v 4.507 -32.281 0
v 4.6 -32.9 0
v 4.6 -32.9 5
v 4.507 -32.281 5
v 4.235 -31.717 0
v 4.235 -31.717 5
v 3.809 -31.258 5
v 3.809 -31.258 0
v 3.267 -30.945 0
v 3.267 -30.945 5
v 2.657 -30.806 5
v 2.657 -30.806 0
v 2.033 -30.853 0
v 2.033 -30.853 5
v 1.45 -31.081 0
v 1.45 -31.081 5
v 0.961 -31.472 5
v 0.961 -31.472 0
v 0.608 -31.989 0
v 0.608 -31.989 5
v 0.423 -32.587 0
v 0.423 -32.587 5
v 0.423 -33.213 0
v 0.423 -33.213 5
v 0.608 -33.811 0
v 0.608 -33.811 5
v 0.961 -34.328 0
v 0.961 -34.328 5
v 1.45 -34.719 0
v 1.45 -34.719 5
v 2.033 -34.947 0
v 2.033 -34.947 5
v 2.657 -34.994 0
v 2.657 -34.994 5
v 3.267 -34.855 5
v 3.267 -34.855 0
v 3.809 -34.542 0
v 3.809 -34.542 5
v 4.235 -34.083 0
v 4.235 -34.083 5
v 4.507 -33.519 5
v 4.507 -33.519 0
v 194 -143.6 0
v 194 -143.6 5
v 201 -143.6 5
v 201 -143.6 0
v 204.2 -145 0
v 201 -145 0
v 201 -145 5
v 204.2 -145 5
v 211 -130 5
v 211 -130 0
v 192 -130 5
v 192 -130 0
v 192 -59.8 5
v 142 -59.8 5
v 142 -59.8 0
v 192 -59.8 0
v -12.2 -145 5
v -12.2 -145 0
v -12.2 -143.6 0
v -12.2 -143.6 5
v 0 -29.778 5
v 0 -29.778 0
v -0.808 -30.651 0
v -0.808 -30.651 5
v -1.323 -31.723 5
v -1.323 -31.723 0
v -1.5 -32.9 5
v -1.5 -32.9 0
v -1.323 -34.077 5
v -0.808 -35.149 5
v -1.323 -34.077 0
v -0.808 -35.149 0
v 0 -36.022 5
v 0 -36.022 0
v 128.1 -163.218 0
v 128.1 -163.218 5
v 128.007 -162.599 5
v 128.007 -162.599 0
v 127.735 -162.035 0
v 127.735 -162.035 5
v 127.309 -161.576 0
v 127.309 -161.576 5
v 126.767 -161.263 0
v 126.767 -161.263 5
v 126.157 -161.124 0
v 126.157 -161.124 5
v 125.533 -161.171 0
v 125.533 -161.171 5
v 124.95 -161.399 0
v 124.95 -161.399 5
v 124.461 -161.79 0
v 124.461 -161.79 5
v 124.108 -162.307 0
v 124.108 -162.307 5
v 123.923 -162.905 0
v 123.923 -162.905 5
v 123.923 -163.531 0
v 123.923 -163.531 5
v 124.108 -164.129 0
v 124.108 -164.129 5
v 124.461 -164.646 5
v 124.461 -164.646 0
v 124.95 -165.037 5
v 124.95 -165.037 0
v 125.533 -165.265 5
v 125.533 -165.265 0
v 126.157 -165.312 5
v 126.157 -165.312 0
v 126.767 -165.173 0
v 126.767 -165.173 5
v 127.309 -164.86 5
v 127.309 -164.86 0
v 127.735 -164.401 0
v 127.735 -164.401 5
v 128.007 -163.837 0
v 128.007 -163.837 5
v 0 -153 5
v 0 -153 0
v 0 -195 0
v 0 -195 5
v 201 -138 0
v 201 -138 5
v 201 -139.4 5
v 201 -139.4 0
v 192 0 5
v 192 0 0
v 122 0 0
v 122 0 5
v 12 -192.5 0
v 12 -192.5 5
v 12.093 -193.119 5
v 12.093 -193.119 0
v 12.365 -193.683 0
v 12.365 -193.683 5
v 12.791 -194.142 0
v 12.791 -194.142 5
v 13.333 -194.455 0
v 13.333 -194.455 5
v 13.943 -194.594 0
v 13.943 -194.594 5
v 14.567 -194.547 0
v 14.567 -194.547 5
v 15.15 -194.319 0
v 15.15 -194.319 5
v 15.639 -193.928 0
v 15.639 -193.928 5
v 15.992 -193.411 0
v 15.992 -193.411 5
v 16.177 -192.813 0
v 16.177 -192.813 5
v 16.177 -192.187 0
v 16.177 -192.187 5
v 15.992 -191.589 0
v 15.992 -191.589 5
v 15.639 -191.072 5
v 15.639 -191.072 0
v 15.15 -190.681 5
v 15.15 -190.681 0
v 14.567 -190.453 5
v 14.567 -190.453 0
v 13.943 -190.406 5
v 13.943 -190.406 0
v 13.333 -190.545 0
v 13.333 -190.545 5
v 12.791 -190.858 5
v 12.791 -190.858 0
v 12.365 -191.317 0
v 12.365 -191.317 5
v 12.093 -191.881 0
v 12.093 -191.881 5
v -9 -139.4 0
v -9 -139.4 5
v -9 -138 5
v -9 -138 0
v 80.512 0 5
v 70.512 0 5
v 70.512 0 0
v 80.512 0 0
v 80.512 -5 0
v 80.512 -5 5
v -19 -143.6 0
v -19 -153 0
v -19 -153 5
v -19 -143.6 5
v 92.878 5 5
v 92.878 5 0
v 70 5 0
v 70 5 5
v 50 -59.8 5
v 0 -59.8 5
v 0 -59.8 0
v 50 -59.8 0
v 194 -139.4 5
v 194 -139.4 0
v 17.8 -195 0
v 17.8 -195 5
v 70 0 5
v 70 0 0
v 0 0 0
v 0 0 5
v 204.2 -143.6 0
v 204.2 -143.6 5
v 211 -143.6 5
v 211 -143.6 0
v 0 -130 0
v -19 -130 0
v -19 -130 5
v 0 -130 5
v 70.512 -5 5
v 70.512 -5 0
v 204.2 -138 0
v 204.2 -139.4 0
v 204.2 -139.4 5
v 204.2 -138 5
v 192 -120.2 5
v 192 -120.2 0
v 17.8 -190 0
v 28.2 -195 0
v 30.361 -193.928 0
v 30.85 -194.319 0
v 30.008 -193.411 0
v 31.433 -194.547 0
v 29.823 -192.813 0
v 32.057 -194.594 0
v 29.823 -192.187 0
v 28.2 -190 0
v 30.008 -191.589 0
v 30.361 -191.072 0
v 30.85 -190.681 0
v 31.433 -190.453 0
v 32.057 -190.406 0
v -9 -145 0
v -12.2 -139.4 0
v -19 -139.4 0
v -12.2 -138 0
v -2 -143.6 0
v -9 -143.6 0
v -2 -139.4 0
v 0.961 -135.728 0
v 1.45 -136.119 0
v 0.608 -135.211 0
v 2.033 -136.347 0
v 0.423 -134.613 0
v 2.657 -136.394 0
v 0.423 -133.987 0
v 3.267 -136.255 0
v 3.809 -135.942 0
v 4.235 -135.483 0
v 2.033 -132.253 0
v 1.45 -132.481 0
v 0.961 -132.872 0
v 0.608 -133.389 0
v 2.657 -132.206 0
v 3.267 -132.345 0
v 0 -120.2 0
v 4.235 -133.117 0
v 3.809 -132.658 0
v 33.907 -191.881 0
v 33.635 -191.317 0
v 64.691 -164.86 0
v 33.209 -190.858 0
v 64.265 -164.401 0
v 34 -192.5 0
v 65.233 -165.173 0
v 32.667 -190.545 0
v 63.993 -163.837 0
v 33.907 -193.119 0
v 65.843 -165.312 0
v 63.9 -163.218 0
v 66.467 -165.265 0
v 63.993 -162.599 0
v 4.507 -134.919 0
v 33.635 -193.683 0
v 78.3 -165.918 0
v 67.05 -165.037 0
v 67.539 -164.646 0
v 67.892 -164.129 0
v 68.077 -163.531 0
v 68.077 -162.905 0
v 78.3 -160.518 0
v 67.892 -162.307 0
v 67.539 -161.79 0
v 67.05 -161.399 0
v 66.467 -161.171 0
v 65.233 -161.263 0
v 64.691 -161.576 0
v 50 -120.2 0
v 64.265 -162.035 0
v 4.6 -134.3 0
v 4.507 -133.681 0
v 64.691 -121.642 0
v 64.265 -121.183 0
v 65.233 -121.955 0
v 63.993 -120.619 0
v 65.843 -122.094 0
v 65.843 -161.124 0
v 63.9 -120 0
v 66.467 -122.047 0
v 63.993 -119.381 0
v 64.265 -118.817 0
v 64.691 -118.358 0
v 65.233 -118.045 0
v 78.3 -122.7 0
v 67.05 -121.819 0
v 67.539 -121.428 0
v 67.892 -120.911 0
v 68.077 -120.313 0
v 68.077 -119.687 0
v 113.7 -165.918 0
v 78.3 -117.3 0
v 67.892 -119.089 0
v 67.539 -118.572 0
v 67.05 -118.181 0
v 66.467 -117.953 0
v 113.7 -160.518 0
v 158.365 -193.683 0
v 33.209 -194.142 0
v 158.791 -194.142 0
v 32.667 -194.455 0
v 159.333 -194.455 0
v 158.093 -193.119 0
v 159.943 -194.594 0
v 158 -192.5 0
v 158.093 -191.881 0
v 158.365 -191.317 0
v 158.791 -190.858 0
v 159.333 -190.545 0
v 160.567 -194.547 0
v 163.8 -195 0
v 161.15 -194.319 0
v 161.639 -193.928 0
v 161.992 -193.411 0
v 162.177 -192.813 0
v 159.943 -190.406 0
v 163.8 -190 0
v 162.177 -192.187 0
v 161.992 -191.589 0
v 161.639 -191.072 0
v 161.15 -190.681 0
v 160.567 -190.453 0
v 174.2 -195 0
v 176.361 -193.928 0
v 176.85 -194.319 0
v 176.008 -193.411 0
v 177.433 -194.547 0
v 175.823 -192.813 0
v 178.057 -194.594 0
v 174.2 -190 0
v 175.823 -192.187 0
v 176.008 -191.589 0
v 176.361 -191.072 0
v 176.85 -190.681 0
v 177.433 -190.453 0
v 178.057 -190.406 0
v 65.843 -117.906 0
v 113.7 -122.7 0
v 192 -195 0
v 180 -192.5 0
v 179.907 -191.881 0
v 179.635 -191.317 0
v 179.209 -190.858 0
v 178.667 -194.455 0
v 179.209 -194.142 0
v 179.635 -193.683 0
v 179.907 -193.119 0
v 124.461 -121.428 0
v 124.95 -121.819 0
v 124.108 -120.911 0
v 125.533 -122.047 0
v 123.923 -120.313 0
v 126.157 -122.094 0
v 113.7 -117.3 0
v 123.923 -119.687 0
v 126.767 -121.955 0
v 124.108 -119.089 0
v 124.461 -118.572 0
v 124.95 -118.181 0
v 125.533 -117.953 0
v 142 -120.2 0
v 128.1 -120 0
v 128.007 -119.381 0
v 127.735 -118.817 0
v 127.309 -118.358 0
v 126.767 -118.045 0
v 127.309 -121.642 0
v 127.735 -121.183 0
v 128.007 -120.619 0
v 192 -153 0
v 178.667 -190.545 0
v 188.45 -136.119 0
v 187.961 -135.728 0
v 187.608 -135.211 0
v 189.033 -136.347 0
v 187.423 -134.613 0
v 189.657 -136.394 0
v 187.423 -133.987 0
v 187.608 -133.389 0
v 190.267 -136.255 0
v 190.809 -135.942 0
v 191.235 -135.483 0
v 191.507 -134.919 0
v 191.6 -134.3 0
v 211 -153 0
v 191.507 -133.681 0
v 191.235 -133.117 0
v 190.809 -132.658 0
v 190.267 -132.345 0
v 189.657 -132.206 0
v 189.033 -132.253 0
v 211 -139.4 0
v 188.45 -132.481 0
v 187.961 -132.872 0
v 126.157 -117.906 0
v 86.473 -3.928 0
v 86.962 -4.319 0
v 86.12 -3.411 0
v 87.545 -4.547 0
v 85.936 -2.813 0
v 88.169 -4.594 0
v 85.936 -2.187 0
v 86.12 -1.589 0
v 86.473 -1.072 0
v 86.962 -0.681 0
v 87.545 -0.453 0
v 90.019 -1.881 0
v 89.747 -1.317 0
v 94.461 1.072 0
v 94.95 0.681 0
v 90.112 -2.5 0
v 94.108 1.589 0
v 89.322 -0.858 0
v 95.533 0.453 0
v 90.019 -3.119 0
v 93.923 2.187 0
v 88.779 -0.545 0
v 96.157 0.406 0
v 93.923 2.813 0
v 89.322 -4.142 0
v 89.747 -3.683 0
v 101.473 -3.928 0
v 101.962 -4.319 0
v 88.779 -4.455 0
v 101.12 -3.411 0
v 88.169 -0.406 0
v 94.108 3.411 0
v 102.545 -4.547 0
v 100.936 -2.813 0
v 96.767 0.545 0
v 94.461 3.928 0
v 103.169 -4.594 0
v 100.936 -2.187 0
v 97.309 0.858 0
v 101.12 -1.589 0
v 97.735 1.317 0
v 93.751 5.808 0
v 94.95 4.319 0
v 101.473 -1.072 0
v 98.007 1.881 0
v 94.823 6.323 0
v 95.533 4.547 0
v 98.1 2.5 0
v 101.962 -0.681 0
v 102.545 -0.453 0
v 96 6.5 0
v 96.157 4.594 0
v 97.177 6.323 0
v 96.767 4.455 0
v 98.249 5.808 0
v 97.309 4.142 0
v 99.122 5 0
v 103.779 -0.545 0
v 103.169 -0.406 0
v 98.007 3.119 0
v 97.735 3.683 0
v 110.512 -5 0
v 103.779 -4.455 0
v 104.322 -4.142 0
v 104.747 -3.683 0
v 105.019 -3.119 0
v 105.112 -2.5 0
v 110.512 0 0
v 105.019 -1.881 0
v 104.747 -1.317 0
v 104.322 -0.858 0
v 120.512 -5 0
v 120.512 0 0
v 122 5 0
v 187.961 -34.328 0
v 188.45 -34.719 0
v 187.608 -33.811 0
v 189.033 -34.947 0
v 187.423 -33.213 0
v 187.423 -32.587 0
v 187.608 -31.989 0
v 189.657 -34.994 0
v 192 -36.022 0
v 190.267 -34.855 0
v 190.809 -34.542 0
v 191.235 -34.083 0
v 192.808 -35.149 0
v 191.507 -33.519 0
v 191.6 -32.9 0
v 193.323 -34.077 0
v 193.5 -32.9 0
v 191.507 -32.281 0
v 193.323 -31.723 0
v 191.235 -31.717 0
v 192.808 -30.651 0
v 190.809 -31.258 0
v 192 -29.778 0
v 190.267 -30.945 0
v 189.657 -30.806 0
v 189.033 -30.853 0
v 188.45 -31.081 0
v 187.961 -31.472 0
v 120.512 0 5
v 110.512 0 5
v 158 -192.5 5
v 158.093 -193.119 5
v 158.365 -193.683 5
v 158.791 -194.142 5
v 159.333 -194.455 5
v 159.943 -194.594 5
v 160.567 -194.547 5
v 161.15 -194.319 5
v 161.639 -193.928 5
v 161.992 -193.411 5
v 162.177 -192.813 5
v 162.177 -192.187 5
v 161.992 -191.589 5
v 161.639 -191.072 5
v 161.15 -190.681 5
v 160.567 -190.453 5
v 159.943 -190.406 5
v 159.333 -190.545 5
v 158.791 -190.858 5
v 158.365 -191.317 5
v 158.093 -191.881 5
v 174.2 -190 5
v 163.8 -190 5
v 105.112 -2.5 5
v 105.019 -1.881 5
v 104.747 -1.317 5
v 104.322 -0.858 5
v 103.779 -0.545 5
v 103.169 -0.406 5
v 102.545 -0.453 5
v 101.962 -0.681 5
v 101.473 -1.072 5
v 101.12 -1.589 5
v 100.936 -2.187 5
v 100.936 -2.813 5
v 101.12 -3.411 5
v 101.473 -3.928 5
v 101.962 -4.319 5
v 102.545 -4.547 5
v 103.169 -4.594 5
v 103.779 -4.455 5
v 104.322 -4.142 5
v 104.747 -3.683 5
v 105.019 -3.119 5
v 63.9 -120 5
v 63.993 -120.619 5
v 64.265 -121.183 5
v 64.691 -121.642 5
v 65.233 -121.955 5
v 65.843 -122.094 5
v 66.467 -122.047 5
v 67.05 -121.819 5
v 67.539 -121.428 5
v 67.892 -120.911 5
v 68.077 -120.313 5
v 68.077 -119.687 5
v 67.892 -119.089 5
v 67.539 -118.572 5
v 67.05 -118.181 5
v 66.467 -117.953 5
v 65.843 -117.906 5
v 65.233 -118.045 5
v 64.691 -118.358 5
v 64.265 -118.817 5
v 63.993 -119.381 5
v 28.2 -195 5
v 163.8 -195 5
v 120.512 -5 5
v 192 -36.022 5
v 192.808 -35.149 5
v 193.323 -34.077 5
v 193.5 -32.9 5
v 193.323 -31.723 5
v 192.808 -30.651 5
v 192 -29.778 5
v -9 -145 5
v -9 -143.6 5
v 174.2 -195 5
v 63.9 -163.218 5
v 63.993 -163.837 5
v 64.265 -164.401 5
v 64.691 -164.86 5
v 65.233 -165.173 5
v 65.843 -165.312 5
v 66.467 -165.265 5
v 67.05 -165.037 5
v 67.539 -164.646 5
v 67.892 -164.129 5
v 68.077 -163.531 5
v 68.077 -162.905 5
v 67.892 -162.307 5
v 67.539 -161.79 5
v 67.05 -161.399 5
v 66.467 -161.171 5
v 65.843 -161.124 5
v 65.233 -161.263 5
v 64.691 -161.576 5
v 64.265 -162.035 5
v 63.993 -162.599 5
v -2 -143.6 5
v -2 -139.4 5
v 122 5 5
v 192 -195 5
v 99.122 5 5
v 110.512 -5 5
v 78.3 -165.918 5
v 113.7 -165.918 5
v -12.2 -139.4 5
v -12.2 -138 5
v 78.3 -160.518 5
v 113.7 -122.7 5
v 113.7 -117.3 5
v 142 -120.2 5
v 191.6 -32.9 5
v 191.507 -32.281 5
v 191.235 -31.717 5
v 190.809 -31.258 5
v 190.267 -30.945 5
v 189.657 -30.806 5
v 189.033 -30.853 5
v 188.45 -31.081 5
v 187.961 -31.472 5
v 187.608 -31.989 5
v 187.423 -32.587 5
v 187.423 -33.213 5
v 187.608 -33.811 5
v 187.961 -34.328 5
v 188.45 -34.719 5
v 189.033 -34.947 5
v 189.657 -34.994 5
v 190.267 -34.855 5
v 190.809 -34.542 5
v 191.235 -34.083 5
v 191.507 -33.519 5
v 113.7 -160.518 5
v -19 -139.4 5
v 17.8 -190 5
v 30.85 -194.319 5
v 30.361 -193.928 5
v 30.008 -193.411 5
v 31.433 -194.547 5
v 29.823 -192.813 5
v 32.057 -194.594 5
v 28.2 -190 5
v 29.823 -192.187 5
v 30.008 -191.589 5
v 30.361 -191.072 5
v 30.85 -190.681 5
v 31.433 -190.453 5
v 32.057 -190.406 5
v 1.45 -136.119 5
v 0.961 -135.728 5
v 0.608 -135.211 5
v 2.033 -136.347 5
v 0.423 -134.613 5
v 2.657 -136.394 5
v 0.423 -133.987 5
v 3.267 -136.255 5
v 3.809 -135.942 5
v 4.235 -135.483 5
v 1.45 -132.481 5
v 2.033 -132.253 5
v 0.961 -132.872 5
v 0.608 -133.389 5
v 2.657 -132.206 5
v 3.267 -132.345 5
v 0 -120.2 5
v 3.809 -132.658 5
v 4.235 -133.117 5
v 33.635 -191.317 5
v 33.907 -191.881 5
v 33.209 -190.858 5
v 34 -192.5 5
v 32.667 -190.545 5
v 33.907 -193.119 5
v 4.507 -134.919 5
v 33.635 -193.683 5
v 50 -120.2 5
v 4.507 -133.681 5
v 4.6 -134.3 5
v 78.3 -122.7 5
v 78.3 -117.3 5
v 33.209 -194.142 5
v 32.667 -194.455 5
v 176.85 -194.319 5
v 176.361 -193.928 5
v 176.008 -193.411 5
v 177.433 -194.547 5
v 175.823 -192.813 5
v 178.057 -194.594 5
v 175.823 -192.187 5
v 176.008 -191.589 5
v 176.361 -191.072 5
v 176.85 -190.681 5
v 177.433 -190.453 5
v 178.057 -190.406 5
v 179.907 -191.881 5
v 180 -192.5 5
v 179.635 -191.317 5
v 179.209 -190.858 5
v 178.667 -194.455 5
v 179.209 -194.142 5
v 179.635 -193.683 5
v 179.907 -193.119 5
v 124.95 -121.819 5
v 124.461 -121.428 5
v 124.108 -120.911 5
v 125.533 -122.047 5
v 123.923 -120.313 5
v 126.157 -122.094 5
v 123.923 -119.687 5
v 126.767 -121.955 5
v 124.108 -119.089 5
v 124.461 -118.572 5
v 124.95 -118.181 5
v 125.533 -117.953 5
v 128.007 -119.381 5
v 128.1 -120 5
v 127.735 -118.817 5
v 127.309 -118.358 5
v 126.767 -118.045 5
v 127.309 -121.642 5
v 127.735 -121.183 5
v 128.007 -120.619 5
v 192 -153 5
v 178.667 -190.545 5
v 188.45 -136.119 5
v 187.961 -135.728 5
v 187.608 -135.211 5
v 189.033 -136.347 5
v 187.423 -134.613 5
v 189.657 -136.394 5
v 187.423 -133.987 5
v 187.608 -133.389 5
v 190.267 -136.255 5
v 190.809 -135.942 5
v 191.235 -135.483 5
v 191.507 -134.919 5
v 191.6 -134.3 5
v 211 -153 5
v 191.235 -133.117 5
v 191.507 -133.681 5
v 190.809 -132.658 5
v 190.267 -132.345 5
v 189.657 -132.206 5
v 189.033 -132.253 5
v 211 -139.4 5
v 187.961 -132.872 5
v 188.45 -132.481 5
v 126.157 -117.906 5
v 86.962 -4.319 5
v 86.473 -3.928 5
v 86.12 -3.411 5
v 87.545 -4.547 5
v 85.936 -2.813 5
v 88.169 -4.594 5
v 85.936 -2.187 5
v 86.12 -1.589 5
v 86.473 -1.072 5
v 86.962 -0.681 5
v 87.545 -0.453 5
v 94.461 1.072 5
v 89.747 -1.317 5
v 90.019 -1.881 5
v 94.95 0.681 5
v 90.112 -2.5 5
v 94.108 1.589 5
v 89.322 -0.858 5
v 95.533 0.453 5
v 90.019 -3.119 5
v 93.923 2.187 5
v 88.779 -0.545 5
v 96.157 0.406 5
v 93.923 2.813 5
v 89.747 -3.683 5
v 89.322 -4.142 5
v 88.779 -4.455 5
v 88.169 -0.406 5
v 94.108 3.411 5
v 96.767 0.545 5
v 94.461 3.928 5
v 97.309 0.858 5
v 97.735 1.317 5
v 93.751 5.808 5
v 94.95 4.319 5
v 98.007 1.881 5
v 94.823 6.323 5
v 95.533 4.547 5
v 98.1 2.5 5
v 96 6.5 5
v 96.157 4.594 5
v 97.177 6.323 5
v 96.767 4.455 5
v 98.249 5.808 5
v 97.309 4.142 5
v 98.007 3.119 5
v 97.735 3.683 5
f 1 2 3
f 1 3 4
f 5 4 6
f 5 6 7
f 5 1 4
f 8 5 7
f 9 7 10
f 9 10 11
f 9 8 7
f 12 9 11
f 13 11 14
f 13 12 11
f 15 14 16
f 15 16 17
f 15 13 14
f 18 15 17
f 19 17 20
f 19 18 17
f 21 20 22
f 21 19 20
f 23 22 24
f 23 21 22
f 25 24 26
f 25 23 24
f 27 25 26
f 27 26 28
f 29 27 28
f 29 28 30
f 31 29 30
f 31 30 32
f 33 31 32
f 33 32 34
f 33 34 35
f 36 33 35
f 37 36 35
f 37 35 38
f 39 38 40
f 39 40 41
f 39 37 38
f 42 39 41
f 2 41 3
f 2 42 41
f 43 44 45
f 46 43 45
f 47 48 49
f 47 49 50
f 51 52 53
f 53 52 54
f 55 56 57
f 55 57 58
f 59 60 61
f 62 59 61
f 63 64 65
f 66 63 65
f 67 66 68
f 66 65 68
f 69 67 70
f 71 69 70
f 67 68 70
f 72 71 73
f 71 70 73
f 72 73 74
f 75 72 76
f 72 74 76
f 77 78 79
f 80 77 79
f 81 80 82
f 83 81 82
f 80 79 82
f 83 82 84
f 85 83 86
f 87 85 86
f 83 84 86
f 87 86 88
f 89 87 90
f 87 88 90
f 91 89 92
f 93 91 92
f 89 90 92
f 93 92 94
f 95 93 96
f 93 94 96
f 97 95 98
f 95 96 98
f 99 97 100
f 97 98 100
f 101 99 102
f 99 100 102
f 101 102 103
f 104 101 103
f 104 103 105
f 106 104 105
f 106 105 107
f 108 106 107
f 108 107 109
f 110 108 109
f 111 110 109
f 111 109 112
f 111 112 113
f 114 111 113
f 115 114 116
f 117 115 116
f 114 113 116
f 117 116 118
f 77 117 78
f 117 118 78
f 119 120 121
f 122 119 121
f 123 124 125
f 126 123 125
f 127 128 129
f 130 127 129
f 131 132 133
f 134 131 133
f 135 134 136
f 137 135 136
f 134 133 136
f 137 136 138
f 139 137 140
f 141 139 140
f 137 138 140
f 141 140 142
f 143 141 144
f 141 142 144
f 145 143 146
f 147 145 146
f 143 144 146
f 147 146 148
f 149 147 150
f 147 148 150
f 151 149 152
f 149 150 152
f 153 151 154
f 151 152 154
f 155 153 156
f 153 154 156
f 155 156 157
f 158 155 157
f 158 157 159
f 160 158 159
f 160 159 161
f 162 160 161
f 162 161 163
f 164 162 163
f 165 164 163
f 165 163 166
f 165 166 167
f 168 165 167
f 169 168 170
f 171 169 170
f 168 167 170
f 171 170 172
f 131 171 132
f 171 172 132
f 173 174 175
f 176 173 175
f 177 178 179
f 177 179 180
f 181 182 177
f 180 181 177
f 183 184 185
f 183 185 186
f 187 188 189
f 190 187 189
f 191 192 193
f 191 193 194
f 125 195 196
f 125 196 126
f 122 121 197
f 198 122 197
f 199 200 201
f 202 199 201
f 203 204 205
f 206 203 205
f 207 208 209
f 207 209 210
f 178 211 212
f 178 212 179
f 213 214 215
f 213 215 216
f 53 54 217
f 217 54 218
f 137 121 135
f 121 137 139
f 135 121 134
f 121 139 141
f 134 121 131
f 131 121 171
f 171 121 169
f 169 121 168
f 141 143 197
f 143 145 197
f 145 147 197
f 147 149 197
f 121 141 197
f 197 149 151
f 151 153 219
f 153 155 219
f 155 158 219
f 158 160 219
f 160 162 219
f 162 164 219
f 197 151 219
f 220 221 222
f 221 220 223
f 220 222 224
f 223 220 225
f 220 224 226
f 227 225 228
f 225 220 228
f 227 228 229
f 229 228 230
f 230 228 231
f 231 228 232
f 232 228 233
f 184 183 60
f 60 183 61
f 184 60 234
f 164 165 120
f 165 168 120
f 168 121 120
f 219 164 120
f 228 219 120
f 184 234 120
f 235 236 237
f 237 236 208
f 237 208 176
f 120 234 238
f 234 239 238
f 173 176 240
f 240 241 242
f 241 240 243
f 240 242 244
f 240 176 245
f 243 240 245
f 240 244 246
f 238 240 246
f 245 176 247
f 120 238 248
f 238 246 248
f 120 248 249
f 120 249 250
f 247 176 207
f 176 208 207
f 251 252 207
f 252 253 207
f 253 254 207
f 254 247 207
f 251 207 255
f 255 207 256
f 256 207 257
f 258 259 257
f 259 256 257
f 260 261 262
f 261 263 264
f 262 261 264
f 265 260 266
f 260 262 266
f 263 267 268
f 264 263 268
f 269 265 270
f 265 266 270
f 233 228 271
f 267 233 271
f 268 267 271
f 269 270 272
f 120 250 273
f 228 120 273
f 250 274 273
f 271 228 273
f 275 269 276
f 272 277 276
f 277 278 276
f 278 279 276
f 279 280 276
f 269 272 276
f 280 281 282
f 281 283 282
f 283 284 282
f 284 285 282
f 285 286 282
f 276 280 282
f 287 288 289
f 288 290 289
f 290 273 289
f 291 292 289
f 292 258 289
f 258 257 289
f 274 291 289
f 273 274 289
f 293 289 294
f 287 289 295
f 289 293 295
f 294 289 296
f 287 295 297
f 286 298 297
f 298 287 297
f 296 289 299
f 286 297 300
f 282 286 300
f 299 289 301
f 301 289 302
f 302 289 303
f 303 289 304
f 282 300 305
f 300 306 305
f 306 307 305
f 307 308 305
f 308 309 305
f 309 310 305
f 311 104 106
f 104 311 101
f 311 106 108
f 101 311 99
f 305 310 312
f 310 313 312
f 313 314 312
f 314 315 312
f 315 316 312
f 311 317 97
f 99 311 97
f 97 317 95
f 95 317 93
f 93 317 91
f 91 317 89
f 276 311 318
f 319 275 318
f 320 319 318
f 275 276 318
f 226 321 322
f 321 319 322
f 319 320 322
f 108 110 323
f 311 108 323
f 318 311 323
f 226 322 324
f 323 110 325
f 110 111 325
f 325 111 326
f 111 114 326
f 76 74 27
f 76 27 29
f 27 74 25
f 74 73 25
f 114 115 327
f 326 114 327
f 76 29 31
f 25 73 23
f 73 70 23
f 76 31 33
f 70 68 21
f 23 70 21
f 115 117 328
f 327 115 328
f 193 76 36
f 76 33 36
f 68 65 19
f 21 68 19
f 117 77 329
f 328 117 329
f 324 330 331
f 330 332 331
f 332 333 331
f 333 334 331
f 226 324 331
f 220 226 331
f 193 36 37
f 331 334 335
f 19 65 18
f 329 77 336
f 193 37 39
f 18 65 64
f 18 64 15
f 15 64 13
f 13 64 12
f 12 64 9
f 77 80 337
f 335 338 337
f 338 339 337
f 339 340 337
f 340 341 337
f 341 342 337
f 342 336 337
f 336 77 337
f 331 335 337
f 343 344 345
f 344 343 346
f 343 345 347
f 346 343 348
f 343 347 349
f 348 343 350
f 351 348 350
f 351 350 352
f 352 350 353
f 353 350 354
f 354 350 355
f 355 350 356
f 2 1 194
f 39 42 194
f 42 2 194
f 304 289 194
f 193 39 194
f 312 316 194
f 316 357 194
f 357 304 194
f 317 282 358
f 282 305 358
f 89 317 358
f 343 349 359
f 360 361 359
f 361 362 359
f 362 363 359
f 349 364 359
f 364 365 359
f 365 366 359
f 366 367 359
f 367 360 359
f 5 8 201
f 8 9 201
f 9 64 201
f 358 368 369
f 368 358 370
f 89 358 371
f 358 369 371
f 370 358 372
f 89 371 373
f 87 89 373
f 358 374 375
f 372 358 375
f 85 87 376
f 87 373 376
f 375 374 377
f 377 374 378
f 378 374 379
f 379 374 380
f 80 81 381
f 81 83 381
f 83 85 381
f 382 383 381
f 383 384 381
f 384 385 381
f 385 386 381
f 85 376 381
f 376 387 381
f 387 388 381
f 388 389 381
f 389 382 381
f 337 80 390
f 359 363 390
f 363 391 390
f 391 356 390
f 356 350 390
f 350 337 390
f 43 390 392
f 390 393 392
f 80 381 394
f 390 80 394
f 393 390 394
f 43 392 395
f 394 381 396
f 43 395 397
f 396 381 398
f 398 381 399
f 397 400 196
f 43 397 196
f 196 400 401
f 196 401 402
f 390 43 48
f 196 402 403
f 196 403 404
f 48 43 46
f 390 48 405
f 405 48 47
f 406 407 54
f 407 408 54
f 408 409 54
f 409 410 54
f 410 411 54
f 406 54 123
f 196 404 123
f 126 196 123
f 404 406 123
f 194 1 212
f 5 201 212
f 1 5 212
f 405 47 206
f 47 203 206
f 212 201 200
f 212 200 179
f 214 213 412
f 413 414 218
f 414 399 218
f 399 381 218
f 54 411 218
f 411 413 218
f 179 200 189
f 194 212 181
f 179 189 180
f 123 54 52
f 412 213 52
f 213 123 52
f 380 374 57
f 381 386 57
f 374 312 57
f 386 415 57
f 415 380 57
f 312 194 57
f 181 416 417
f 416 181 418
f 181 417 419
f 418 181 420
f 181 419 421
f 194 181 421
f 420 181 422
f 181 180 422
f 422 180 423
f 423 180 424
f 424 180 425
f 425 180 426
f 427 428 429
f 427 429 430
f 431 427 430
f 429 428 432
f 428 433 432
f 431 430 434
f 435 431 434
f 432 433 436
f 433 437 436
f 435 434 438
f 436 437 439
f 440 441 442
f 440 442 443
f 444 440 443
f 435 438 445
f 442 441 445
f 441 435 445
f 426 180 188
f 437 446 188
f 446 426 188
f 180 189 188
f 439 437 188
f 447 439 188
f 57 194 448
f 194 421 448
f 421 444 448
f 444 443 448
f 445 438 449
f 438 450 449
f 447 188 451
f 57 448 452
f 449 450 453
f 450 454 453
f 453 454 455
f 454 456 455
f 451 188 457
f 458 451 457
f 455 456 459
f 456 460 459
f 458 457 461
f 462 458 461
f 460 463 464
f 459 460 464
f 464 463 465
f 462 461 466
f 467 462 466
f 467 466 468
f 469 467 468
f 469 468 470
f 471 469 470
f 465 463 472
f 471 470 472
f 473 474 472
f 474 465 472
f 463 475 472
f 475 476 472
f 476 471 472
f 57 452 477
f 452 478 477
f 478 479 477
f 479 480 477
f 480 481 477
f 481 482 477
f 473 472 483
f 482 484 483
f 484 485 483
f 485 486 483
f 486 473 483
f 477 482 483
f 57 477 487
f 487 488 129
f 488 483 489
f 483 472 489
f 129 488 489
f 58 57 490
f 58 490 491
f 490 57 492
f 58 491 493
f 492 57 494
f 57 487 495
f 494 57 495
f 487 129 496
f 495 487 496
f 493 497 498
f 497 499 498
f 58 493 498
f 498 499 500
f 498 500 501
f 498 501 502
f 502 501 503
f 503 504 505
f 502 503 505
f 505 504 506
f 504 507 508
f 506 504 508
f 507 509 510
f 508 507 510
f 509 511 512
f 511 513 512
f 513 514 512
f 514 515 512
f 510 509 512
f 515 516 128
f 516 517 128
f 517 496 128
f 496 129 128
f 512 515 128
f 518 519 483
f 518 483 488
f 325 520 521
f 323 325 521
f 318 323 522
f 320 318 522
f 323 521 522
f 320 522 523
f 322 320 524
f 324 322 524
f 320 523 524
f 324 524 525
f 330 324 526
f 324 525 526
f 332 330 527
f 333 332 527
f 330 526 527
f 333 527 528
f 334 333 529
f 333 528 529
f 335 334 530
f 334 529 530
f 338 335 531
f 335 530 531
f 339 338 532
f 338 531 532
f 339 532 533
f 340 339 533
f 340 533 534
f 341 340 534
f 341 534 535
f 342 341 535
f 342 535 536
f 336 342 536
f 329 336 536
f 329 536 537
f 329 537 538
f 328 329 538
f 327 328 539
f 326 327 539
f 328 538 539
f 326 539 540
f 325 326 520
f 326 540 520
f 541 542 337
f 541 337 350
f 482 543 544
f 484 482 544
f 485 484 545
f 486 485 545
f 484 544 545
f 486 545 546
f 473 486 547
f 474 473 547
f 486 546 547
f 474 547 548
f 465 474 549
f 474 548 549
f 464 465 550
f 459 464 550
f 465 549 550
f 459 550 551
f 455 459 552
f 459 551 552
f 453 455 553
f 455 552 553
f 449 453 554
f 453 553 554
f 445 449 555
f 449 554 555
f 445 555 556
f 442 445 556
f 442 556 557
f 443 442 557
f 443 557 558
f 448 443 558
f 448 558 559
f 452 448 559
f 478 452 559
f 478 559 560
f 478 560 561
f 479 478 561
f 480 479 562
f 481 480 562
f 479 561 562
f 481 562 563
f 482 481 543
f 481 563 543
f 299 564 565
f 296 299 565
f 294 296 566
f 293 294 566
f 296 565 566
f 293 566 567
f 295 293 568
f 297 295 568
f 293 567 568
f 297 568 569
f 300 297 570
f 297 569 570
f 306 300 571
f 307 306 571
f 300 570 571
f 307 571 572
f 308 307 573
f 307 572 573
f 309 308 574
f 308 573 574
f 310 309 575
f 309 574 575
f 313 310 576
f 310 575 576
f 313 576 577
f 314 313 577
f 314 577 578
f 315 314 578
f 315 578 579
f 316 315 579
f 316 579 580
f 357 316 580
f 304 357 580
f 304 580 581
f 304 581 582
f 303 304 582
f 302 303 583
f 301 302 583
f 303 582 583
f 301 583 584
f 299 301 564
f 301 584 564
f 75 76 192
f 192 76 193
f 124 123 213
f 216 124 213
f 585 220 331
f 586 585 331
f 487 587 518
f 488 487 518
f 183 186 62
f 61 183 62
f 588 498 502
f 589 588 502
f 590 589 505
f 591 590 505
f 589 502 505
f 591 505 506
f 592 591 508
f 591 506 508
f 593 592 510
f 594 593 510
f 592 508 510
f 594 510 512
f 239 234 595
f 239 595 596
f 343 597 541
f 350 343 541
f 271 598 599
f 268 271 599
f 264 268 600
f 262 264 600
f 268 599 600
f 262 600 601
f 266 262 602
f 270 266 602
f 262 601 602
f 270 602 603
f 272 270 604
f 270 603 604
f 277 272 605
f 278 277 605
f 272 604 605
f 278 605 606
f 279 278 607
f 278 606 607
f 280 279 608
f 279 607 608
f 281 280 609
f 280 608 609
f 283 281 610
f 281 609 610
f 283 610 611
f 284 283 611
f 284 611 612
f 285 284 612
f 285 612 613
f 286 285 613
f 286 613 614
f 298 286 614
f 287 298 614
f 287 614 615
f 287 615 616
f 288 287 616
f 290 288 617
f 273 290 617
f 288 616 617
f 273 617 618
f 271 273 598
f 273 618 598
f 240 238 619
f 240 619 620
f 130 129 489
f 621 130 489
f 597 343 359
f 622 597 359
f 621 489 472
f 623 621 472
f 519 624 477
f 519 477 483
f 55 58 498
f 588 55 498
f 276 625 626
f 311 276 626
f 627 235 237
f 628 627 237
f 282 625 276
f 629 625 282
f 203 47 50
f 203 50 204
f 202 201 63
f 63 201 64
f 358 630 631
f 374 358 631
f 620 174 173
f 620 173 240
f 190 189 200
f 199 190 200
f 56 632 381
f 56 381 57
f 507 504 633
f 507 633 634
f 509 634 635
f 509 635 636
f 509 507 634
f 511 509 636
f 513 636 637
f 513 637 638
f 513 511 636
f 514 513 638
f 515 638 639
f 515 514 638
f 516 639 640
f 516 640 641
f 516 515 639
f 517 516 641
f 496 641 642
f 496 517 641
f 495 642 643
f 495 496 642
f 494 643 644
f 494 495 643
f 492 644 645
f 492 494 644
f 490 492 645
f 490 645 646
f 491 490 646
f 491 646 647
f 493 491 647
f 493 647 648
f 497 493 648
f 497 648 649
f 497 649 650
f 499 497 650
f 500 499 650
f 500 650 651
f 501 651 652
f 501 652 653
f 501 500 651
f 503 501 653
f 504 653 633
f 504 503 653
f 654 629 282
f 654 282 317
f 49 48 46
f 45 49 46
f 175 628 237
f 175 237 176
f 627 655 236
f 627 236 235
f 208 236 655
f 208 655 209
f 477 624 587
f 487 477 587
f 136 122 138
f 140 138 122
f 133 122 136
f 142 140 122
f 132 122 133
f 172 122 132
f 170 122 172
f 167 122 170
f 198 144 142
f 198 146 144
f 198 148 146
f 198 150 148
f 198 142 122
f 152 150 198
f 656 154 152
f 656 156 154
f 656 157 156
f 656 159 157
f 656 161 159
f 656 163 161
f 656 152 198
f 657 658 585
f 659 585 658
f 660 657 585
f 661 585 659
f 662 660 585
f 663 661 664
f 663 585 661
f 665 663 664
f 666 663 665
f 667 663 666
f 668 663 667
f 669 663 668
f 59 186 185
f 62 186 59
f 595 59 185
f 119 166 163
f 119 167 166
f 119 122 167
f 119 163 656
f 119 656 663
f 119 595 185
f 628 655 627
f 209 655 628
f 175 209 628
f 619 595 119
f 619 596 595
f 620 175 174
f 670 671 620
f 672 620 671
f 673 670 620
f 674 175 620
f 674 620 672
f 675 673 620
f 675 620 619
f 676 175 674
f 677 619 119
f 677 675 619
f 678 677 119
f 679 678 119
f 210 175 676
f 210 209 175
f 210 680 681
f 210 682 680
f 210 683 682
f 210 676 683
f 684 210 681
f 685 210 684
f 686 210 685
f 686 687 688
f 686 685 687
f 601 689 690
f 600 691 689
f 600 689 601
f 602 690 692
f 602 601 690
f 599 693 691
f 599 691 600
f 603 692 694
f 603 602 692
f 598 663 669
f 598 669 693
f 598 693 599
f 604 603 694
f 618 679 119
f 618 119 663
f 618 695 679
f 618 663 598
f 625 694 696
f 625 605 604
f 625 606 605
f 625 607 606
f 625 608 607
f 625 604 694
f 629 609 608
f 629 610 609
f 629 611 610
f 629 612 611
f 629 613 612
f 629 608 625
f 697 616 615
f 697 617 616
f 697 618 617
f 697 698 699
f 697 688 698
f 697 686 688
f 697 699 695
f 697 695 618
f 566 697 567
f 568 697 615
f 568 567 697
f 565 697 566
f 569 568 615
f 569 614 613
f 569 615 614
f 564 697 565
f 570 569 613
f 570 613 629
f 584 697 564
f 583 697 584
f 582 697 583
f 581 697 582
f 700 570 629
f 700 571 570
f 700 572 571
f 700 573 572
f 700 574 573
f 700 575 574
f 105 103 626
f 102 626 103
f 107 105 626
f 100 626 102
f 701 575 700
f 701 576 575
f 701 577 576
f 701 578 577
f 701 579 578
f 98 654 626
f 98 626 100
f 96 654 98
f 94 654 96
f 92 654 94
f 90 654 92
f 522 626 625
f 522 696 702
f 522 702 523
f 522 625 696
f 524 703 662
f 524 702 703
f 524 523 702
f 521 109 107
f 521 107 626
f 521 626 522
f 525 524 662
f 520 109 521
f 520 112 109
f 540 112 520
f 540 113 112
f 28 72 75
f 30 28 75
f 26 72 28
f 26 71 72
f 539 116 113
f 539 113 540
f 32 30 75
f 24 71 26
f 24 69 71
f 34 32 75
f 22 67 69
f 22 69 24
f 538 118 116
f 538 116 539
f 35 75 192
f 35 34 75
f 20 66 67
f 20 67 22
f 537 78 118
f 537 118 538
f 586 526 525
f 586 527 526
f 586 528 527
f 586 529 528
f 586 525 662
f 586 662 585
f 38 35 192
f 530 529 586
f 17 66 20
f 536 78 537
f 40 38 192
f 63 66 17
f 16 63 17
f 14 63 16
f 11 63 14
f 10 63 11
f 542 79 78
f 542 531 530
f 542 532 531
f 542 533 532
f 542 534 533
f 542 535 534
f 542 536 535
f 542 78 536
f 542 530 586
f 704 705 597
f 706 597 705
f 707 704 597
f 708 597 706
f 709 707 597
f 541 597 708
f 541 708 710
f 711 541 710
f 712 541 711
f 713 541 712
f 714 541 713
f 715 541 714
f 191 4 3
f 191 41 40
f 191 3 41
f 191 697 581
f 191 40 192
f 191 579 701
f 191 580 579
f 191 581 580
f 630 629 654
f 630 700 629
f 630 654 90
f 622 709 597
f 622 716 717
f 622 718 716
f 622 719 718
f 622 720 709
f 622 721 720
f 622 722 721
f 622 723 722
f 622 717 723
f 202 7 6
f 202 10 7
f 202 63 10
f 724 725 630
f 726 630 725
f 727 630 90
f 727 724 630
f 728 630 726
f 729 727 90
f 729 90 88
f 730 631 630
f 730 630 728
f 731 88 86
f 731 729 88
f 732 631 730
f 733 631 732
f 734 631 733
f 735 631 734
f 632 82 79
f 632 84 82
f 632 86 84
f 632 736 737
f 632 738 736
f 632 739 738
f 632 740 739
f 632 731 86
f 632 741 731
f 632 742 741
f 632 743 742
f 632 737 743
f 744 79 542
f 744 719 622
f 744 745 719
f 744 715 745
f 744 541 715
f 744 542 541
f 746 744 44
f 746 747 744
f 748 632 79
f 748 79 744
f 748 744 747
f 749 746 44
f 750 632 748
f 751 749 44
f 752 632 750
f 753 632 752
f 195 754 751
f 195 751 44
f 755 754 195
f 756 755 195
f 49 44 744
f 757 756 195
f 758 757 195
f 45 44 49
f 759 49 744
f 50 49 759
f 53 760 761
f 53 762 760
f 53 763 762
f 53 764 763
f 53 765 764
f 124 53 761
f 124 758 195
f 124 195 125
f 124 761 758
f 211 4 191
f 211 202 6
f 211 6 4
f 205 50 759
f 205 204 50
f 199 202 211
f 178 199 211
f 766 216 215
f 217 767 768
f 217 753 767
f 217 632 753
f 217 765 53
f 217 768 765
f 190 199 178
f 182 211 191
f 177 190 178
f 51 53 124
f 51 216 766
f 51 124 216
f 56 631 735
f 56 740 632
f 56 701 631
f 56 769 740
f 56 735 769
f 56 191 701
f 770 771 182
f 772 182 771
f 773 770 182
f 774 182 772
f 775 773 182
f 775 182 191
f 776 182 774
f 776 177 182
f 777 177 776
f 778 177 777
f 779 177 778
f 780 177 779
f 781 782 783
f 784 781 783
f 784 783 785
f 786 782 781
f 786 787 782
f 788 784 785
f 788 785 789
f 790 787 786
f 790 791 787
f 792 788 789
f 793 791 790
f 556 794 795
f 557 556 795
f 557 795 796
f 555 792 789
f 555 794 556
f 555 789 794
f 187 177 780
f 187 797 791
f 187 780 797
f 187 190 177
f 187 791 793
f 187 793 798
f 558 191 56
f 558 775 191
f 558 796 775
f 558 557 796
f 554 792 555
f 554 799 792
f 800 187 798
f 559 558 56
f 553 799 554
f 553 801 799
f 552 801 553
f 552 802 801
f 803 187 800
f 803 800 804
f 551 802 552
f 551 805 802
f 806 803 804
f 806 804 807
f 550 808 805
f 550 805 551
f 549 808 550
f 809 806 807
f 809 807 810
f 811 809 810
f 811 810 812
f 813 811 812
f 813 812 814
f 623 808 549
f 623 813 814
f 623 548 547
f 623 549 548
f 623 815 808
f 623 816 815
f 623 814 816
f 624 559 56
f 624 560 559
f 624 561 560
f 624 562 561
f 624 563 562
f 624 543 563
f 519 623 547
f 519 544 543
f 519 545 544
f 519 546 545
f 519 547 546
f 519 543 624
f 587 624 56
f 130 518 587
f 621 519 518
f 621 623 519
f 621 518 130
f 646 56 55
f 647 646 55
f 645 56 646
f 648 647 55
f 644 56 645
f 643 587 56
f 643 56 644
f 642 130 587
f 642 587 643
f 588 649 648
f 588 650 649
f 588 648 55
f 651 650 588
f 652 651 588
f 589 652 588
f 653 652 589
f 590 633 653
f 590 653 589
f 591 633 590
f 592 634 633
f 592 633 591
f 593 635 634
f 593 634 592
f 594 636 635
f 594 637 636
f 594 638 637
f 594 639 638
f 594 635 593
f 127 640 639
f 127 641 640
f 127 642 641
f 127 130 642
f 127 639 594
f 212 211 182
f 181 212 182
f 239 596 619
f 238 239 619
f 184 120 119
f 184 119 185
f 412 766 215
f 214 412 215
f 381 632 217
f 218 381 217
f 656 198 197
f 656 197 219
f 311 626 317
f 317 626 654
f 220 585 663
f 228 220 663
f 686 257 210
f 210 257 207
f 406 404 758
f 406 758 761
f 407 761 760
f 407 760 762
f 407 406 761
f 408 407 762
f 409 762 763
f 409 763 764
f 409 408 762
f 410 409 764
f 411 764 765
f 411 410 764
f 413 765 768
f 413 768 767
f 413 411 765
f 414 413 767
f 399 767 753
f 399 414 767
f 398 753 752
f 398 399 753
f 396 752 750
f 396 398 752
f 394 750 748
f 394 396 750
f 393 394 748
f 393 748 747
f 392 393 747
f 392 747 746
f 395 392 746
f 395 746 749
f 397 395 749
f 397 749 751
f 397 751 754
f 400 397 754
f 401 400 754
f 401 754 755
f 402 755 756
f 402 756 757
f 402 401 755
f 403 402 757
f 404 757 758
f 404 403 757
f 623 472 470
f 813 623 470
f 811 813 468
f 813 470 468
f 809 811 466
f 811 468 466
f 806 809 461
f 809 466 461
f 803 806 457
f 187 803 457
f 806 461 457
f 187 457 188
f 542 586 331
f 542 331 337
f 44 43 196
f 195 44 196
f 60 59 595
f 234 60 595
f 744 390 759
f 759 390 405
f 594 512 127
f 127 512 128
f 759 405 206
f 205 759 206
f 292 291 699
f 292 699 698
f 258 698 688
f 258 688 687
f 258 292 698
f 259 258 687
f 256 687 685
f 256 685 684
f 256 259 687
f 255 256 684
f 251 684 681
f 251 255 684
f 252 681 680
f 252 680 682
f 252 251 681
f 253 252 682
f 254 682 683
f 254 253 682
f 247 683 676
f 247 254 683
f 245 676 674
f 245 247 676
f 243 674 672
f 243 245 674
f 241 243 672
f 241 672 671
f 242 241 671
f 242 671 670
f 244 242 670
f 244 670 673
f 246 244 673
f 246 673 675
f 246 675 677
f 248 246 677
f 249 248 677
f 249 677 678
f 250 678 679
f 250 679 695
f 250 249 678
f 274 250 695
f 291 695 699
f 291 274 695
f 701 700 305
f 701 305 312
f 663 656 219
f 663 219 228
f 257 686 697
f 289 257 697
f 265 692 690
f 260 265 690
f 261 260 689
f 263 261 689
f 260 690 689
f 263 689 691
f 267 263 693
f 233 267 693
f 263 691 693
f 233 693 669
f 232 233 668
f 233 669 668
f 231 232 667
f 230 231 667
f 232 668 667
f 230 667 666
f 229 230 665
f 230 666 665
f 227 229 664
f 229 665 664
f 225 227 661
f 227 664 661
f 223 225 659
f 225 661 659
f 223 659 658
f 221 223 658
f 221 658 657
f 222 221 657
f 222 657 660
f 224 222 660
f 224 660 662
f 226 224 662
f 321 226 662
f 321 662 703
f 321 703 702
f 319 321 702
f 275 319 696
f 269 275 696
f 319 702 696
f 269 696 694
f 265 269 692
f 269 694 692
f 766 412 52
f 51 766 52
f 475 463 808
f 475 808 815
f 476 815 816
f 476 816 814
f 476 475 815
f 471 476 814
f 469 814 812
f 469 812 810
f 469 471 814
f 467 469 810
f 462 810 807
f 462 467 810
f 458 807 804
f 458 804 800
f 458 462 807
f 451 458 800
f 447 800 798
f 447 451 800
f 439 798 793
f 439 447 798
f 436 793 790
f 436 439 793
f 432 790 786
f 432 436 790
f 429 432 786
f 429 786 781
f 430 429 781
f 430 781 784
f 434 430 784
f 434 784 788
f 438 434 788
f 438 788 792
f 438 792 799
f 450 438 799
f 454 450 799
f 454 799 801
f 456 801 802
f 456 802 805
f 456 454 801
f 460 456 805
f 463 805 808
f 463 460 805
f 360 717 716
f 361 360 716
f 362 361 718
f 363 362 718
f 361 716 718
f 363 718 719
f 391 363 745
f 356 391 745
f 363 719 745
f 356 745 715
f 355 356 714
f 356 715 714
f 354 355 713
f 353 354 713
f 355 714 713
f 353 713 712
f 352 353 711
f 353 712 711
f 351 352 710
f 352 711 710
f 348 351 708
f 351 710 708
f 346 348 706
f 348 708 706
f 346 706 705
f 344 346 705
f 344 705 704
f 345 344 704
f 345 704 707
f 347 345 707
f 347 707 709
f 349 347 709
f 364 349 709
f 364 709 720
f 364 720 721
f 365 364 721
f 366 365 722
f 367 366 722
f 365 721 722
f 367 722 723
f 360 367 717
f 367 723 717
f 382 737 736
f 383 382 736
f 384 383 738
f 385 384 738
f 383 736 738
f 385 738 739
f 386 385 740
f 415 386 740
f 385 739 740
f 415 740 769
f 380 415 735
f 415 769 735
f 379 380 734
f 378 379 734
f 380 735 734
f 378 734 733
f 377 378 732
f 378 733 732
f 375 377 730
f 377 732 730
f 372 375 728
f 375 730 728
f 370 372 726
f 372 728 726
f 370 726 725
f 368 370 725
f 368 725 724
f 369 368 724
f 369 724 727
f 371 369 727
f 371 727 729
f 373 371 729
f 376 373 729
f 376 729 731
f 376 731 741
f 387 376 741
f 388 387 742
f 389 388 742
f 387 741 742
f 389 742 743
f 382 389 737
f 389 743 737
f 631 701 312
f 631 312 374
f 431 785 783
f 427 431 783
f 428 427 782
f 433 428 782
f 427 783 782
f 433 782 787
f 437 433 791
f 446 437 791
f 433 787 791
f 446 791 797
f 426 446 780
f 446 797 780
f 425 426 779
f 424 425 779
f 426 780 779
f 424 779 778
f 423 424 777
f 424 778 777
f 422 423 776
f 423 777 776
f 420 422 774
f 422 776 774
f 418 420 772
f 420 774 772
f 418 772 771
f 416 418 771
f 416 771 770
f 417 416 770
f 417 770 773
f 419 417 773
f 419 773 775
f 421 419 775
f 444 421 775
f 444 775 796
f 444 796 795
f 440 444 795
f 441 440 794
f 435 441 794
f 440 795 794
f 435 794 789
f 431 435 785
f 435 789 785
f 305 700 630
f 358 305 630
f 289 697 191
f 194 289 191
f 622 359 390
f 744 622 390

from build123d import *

# Parameters (mm, degrees)
SKETCH1_R           = 2.1
BOSS_EXTRUDE1_DEPTH = 5
SKETCH5_W           = 35
SKETCH5_H           = 5
SKETCH5_W_2         = 10
CUT_EXTRUDE2_DEPTH  = 5
SKETCH6_R           = 2.1
CUT_EXTRUDE3_DEPTH  = 5
SKETCH8_R           = 2.1
SKETCH8_W           = 10
SKETCH8_H           = 5
CUT_EXTRUDE4_DEPTH  = 5
BOSS_EXTRUDE3_START = -5
BOSS_EXTRUDE3_DEPTH = 5
SKETCH12_W          = 10.4
SKETCH12_H          = 5
CUT_EXTRUDE5_DEPTH  = 5
SKETCH13_W          = 35.4
SKETCH13_H          = 5.4
CUT_EXTRUDE6_DEPTH  = 5
SKETCH16_W          = 50
SKETCH16_H          = 60.4
CUT_EXTRUDE8_DEPTH  = 5
SKETCH17_W          = 6.8
SKETCH17_H          = 4.2
SKETCH17_W_2        = 3.2
SKETCH17_H_2        = 1.4
SKETCH17_W_3        = 7
CUT_EXTRUDE9_DEPTH  = 5


with BuildPart() as part:
    # Sketch1 → Boss-Extrude1 (new body)
    with BuildSketch(Plane.XY):
        with BuildLine():
            ThreePointArc((0, -29.777501001), (-1.5, -32.9), (0, -36.022498999))
            Line((0, -36.022498999), (0, -60))
            Line((0, -60), (50, -60))
            Line((50, -60), (50, -120))
            Line((50, -120), (0, -120))
            Line((0, -120), (0, -131.177501001))
            ThreePointArc((0, -131.177501001), (-1.5, -134.3), (0, -137.422498999))
            Line((0, -137.422498999), (0, -195))
            Line((0, -195), (192, -195))
            Line((192, -195), (192, -137.422498999))
            ThreePointArc((192, -137.422498999), (193.5, -134.3), (192, -131.177501001))
            Line((192, -131.177501001), (192, -120))
            Line((192, -120), (142, -120))
            Line((142, -120), (142, -60))
            Line((142, -60), (192, -60))
            Line((192, -60), (192, -36.022498999))
            ThreePointArc((192, -36.022498999), (193.5, -32.9), (192, -29.777501001))
            Line((192, -29.777501001), (192, 0))
            Line((192, 0), (122, 0))
            Line((122, 0), (122, 5))
            Line((122, 5), (99.122498999, 5))
            ThreePointArc((99.122498999, 5), (96, 6.5), (92.877501001, 5))
            Line((92.877501001, 5), (70, 5))
            Line((70, 5), (70, 0))
            Line((70, 0), (59, 0))
            Line((59, 0), (0, 0))
            Line((0, 0), (0, -21))
            Line((0, -21), (0, -29.777501001))
        make_face()
        with Locations((2.5, -134.3)):
            Circle(SKETCH1_R, mode=Mode.SUBTRACT)
        with Locations((189.5, -134.3)):
            Circle(SKETCH1_R, mode=Mode.SUBTRACT)
        with Locations((2.5, -32.9)):
            Circle(SKETCH1_R, mode=Mode.SUBTRACT)
        with Locations((96, 2.5)):
            Circle(SKETCH1_R, mode=Mode.SUBTRACT)
        with Locations((189.5, -32.9)):
            Circle(SKETCH1_R, mode=Mode.SUBTRACT)
    extrude(amount=BOSS_EXTRUDE1_DEPTH)

    # Sketch5 → Cut-Extrude2 (cut)
    with BuildSketch(Plane.XY.offset(5)):
        with Locations((96, -163.217967697)):
            Rectangle(SKETCH5_W, SKETCH5_H)
        with Locations((96, -120)):
            Rectangle(SKETCH5_W, SKETCH5_H)
        with Locations((23, -192.5)):
            Rectangle(SKETCH5_W_2, SKETCH5_H)
        with Locations((169, -192.5)):
            Rectangle(SKETCH5_W_2, SKETCH5_H)
    extrude(amount=-CUT_EXTRUDE2_DEPTH, mode=Mode.SUBTRACT)

    # Sketch6 → Cut-Extrude3 (cut)
    with BuildSketch(Plane.XY.offset(5)):
        with Locations((213.012247999, -33.340051313)):
            Circle(SKETCH6_R)
        with Locations((177.9, -192.5)):
            Circle(SKETCH6_R)
        with Locations(Location((160.1, -192.5, 0), (0, 0, 180))):
            Circle(SKETCH6_R)
        with Locations((-21.012247999, -33.340051313)):
            Circle(SKETCH6_R)
        with Locations((31.9, -192.5)):
            Circle(SKETCH6_R)
        with Locations(Location((14.1, -192.5, 0), (0, 0, 180))):
            Circle(SKETCH6_R)
        with Locations((126, -120)):
            Circle(SKETCH6_R)
        with Locations((126, -163.217967697)):
            Circle(SKETCH6_R)
        with Locations(Location((66, -163.217967697, 0), (0, 0, 180))):
            Circle(SKETCH6_R)
        with Locations(Location((66, -120, 0), (0, 0, 180))):
            Circle(SKETCH6_R)
    extrude(amount=-CUT_EXTRUDE3_DEPTH, mode=Mode.SUBTRACT)

    # Sketch8 → Cut-Extrude4 (cut)
    with BuildSketch(Plane.XY.offset(5)):
        with Locations((88.012247999, -2.5)):
            Circle(SKETCH8_R)
        with Locations((103.012247999, -2.5)):
            Circle(SKETCH8_R)
        with Locations((75.512247999, -2.5)):
            Rectangle(SKETCH8_W, SKETCH8_H)
        with Locations((115.512247999, -2.5)):
            Rectangle(SKETCH8_W, SKETCH8_H)
    extrude(amount=-CUT_EXTRUDE4_DEPTH, mode=Mode.SUBTRACT)

    # Sketch9 → Boss-Extrude3 (add)
    with BuildSketch(Plane.XY.offset(5).offset(BOSS_EXTRUDE3_START)):
        with BuildLine():
            Line((-19, -130), (0, -130))
            Line((0, -130), (0, -131.177501001))
            ThreePointArc((0, -131.177501001), (-1.5, -134.3), (0, -137.422498999))
            Line((0, -137.422498999), (0, -153))
            Line((0, -153), (-19, -153))
            Line((-19, -153), (-19, -130))
        make_face()
    boss_extrude3 = extrude(amount=BOSS_EXTRUDE3_DEPTH)

    # Sketch12 → Cut-Extrude5 (cut)
    with BuildSketch(Plane.XY.offset(5)):
        with Locations((23, -192.5)):
            Rectangle(SKETCH12_W, SKETCH12_H)
        with Locations((169, -192.5)):
            Rectangle(SKETCH12_W, SKETCH12_H)
    extrude(amount=-CUT_EXTRUDE5_DEPTH, mode=Mode.SUBTRACT)

    # Sketch13 → Cut-Extrude6 (cut)
    with BuildSketch(Plane.XY.offset(5)):
        with Locations((96, -120)):
            Rectangle(SKETCH13_W, SKETCH13_H)
        with Locations((96, -163.217967697)):
            Rectangle(SKETCH13_W, SKETCH13_H)
    extrude(amount=-CUT_EXTRUDE6_DEPTH, mode=Mode.SUBTRACT)

    # Sketch16 → Cut-Extrude8 (cut)
    with BuildSketch(Plane.XY.offset(5)):
        with Locations((25, -90)):
            Rectangle(SKETCH16_W, SKETCH16_H)
        with Locations((167, -90)):
            Rectangle(SKETCH16_W, SKETCH16_H)
    extrude(amount=-CUT_EXTRUDE8_DEPTH, mode=Mode.SUBTRACT)

    # Mirror2: Boss-Extrude3 across plane
    add(boss_extrude3.mirror(Plane(origin=(96, 0, 0), x_dir=(0, 0, 1), z_dir=(1, 0, 0))))

    # Sketch17 → Cut-Extrude9 (cut)
    with BuildSketch(Plane.XY.offset(5)):
        with Locations((207.6, -141.5)):
            Rectangle(SKETCH17_W, SKETCH17_H)
        with Locations((202.6, -141.5)):
            Rectangle(SKETCH17_W_2, SKETCH17_H)
        with Locations((202.6, -138.7)):
            Rectangle(SKETCH17_W_2, SKETCH17_H_2)
        with Locations((197.5, -141.5)):
            Rectangle(SKETCH17_W_3, SKETCH17_H)
        with Locations((202.6, -144.3)):
            Rectangle(SKETCH17_W_2, SKETCH17_H_2)
        with Locations((-15.6, -141.5)):
            Rectangle(SKETCH17_W, SKETCH17_H)
        with Locations((-10.6, -138.7)):
            Rectangle(SKETCH17_W_2, SKETCH17_H_2)
        with Locations((-10.6, -141.5)):
            Rectangle(SKETCH17_W_2, SKETCH17_H)
        with Locations((-5.5, -141.5)):
            Rectangle(SKETCH17_W_3, SKETCH17_H)
        with Locations((-10.6, -144.3)):
            Rectangle(SKETCH17_W_2, SKETCH17_H_2)
    extrude(amount=-CUT_EXTRUDE9_DEPTH, mode=Mode.SUBTRACT)


solid = part.part
